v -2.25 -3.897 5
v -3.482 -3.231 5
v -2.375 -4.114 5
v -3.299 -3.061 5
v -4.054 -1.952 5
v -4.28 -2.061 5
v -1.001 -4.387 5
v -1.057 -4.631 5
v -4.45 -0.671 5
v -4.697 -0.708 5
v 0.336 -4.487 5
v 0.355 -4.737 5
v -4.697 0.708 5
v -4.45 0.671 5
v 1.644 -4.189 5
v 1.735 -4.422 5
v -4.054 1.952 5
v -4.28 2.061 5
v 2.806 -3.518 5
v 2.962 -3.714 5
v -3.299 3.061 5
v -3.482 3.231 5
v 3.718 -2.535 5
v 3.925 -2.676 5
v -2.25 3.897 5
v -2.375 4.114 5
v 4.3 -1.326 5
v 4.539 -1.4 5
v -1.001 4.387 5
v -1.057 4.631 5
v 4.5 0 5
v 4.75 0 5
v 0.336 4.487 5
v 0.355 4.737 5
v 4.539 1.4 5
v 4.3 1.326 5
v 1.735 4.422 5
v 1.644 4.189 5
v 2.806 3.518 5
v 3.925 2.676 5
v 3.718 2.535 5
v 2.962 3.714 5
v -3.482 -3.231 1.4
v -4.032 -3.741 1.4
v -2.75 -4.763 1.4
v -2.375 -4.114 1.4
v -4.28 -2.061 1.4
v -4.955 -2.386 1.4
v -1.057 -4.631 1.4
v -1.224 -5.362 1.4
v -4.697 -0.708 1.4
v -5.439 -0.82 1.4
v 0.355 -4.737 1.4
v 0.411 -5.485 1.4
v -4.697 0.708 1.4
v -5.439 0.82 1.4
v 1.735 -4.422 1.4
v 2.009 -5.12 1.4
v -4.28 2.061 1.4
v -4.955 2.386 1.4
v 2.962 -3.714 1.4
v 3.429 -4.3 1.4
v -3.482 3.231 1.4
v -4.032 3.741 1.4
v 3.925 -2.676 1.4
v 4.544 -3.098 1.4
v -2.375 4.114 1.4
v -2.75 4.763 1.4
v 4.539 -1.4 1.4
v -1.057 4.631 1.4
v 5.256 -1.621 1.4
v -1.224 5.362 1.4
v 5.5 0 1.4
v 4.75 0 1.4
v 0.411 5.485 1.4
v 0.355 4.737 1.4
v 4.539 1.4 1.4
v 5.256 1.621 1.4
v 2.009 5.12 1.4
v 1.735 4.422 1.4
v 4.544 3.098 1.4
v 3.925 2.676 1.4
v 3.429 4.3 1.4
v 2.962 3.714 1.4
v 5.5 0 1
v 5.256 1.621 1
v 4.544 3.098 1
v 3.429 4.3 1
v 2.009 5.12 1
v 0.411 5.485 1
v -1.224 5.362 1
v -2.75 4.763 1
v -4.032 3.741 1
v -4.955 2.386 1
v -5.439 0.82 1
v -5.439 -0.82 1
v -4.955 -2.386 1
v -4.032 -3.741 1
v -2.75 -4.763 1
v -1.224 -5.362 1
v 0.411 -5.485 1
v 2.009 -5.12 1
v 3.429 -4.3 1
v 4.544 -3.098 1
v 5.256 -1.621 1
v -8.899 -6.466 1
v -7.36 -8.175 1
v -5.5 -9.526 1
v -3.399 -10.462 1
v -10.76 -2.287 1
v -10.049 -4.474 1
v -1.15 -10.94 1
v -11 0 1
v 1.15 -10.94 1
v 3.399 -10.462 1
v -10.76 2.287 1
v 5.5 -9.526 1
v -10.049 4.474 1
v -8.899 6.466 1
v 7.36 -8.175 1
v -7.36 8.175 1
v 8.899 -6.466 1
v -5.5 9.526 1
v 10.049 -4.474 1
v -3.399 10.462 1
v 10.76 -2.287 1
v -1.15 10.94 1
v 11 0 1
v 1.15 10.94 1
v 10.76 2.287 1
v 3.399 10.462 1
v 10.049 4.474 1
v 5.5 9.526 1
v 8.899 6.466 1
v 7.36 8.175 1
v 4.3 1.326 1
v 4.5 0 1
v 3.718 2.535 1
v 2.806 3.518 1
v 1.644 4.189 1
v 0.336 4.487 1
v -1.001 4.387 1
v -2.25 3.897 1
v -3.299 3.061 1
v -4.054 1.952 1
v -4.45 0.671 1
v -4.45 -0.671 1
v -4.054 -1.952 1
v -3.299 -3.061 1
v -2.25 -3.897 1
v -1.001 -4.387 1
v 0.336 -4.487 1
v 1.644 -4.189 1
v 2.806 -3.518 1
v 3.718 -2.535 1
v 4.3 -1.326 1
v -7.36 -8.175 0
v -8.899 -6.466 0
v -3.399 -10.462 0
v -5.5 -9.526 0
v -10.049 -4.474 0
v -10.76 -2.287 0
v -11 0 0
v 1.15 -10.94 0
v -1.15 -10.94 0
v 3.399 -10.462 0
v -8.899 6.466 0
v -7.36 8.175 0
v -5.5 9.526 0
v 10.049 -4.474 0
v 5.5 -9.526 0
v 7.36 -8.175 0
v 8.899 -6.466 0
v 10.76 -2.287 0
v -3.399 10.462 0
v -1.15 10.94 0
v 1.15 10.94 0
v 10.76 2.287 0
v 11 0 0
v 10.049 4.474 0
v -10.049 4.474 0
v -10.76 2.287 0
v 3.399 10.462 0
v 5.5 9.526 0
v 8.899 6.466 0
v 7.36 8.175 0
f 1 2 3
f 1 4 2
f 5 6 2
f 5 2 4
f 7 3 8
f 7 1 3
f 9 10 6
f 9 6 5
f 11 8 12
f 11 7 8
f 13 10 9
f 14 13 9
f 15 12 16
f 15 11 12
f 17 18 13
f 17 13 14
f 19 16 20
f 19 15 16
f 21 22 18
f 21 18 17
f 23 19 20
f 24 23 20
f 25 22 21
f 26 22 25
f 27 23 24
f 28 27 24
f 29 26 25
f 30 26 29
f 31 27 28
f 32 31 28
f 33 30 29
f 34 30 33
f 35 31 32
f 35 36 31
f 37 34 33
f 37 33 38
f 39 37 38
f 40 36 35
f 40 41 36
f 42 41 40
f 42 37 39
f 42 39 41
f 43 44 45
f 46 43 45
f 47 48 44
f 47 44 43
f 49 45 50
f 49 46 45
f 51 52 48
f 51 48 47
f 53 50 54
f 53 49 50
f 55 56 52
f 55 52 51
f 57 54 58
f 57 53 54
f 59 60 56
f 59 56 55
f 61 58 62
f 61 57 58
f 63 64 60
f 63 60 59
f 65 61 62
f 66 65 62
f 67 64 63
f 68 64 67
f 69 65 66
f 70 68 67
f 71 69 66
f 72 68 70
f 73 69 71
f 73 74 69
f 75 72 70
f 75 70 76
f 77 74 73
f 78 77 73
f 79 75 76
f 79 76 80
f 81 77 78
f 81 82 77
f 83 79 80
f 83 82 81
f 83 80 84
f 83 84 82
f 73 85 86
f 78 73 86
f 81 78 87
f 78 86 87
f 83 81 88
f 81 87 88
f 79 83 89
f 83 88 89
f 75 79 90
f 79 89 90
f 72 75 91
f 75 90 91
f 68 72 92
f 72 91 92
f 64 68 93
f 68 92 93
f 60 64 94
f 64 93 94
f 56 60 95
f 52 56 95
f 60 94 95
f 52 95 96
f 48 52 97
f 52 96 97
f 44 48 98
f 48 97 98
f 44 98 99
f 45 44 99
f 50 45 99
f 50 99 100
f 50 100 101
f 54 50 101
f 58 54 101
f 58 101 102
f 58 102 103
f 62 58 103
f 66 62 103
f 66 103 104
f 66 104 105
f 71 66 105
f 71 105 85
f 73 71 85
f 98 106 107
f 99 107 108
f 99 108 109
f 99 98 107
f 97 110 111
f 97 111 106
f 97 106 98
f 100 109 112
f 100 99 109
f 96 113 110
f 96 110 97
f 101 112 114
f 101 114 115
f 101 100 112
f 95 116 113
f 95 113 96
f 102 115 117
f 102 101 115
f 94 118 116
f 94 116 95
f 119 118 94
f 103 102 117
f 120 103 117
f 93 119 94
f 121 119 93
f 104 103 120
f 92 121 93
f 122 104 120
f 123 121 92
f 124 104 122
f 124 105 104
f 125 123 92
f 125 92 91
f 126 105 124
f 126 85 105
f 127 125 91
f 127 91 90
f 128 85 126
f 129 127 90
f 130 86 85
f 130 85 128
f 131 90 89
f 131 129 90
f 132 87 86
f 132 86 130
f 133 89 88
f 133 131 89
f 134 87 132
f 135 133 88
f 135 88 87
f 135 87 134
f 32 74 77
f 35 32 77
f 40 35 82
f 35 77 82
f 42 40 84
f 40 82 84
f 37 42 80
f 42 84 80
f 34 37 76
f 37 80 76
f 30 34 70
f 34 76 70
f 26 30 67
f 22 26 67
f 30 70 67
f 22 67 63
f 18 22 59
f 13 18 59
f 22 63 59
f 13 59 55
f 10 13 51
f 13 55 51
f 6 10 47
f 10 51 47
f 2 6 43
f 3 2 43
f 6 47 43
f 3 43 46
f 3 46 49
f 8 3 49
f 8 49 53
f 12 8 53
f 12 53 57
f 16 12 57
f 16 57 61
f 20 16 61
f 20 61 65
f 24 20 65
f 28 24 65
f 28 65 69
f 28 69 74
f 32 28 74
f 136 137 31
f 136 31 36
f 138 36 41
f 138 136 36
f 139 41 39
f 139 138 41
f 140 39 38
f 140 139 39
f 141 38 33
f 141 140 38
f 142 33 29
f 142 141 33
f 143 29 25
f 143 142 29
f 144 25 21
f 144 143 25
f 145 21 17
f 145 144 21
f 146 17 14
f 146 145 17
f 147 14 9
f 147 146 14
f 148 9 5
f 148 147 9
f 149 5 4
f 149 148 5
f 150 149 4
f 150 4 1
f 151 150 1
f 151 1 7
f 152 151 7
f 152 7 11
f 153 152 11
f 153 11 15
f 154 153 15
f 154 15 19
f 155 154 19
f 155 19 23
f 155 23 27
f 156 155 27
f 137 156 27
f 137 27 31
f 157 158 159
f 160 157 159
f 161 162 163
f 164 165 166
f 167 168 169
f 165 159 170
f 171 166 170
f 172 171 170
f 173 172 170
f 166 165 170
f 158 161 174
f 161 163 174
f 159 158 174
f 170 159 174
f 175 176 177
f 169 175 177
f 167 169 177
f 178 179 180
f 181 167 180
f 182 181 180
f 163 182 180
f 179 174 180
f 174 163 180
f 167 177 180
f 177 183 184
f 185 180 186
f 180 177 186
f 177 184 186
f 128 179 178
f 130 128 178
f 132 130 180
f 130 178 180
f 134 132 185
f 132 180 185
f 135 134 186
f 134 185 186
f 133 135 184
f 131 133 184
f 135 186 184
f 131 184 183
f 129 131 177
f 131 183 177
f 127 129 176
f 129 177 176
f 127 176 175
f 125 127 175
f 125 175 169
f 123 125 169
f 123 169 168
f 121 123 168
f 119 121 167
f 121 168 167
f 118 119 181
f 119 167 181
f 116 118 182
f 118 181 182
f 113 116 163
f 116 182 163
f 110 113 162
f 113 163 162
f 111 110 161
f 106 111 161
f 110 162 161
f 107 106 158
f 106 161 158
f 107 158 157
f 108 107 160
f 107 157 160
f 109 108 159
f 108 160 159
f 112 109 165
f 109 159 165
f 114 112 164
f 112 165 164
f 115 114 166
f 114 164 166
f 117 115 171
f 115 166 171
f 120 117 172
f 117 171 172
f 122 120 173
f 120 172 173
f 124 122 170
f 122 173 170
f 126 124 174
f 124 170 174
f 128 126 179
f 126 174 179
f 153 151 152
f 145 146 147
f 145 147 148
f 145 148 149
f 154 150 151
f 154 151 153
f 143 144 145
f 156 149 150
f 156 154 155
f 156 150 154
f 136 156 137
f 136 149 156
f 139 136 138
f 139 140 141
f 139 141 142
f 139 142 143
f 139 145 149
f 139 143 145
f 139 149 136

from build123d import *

# Parameters (mm, degrees)
F0_R     = 11
F0_R_2   = 5.5
F1_DEPTH = 1
F0_R_3   = 4.75
F0_R_4   = 4.5
F2_DEPTH = 1.4
F3_DEPTH = 5
F4_DEPTH = 1


with BuildPart() as f1:
    # F0 (on Top) → F1 (new body)
    with BuildSketch(Plane.XY):
        Circle(F0_R)
        Circle(F0_R_2, mode=Mode.SUBTRACT)
    extrude(amount=F1_DEPTH)

    # F0 (on Top) → F2 (join)
    with BuildSketch(Plane.XY):
        Circle(F0_R_2)
        Circle(F0_R_3, mode=Mode.SUBTRACT)
        Circle(F0_R_3)
        Circle(F0_R_4, mode=Mode.SUBTRACT)
    extrude(amount=F2_DEPTH)

    # F0 (on Top) → F3 (join)
    with BuildSketch(Plane.XY):
        Circle(F0_R_3)
        Circle(F0_R_4, mode=Mode.SUBTRACT)
    extrude(amount=F3_DEPTH)

    # F0 (on Top) → F4 (join)
    with BuildSketch(Plane.XY):
        Circle(F0_R_4)
    extrude(amount=F4_DEPTH)


solid = f1.part
